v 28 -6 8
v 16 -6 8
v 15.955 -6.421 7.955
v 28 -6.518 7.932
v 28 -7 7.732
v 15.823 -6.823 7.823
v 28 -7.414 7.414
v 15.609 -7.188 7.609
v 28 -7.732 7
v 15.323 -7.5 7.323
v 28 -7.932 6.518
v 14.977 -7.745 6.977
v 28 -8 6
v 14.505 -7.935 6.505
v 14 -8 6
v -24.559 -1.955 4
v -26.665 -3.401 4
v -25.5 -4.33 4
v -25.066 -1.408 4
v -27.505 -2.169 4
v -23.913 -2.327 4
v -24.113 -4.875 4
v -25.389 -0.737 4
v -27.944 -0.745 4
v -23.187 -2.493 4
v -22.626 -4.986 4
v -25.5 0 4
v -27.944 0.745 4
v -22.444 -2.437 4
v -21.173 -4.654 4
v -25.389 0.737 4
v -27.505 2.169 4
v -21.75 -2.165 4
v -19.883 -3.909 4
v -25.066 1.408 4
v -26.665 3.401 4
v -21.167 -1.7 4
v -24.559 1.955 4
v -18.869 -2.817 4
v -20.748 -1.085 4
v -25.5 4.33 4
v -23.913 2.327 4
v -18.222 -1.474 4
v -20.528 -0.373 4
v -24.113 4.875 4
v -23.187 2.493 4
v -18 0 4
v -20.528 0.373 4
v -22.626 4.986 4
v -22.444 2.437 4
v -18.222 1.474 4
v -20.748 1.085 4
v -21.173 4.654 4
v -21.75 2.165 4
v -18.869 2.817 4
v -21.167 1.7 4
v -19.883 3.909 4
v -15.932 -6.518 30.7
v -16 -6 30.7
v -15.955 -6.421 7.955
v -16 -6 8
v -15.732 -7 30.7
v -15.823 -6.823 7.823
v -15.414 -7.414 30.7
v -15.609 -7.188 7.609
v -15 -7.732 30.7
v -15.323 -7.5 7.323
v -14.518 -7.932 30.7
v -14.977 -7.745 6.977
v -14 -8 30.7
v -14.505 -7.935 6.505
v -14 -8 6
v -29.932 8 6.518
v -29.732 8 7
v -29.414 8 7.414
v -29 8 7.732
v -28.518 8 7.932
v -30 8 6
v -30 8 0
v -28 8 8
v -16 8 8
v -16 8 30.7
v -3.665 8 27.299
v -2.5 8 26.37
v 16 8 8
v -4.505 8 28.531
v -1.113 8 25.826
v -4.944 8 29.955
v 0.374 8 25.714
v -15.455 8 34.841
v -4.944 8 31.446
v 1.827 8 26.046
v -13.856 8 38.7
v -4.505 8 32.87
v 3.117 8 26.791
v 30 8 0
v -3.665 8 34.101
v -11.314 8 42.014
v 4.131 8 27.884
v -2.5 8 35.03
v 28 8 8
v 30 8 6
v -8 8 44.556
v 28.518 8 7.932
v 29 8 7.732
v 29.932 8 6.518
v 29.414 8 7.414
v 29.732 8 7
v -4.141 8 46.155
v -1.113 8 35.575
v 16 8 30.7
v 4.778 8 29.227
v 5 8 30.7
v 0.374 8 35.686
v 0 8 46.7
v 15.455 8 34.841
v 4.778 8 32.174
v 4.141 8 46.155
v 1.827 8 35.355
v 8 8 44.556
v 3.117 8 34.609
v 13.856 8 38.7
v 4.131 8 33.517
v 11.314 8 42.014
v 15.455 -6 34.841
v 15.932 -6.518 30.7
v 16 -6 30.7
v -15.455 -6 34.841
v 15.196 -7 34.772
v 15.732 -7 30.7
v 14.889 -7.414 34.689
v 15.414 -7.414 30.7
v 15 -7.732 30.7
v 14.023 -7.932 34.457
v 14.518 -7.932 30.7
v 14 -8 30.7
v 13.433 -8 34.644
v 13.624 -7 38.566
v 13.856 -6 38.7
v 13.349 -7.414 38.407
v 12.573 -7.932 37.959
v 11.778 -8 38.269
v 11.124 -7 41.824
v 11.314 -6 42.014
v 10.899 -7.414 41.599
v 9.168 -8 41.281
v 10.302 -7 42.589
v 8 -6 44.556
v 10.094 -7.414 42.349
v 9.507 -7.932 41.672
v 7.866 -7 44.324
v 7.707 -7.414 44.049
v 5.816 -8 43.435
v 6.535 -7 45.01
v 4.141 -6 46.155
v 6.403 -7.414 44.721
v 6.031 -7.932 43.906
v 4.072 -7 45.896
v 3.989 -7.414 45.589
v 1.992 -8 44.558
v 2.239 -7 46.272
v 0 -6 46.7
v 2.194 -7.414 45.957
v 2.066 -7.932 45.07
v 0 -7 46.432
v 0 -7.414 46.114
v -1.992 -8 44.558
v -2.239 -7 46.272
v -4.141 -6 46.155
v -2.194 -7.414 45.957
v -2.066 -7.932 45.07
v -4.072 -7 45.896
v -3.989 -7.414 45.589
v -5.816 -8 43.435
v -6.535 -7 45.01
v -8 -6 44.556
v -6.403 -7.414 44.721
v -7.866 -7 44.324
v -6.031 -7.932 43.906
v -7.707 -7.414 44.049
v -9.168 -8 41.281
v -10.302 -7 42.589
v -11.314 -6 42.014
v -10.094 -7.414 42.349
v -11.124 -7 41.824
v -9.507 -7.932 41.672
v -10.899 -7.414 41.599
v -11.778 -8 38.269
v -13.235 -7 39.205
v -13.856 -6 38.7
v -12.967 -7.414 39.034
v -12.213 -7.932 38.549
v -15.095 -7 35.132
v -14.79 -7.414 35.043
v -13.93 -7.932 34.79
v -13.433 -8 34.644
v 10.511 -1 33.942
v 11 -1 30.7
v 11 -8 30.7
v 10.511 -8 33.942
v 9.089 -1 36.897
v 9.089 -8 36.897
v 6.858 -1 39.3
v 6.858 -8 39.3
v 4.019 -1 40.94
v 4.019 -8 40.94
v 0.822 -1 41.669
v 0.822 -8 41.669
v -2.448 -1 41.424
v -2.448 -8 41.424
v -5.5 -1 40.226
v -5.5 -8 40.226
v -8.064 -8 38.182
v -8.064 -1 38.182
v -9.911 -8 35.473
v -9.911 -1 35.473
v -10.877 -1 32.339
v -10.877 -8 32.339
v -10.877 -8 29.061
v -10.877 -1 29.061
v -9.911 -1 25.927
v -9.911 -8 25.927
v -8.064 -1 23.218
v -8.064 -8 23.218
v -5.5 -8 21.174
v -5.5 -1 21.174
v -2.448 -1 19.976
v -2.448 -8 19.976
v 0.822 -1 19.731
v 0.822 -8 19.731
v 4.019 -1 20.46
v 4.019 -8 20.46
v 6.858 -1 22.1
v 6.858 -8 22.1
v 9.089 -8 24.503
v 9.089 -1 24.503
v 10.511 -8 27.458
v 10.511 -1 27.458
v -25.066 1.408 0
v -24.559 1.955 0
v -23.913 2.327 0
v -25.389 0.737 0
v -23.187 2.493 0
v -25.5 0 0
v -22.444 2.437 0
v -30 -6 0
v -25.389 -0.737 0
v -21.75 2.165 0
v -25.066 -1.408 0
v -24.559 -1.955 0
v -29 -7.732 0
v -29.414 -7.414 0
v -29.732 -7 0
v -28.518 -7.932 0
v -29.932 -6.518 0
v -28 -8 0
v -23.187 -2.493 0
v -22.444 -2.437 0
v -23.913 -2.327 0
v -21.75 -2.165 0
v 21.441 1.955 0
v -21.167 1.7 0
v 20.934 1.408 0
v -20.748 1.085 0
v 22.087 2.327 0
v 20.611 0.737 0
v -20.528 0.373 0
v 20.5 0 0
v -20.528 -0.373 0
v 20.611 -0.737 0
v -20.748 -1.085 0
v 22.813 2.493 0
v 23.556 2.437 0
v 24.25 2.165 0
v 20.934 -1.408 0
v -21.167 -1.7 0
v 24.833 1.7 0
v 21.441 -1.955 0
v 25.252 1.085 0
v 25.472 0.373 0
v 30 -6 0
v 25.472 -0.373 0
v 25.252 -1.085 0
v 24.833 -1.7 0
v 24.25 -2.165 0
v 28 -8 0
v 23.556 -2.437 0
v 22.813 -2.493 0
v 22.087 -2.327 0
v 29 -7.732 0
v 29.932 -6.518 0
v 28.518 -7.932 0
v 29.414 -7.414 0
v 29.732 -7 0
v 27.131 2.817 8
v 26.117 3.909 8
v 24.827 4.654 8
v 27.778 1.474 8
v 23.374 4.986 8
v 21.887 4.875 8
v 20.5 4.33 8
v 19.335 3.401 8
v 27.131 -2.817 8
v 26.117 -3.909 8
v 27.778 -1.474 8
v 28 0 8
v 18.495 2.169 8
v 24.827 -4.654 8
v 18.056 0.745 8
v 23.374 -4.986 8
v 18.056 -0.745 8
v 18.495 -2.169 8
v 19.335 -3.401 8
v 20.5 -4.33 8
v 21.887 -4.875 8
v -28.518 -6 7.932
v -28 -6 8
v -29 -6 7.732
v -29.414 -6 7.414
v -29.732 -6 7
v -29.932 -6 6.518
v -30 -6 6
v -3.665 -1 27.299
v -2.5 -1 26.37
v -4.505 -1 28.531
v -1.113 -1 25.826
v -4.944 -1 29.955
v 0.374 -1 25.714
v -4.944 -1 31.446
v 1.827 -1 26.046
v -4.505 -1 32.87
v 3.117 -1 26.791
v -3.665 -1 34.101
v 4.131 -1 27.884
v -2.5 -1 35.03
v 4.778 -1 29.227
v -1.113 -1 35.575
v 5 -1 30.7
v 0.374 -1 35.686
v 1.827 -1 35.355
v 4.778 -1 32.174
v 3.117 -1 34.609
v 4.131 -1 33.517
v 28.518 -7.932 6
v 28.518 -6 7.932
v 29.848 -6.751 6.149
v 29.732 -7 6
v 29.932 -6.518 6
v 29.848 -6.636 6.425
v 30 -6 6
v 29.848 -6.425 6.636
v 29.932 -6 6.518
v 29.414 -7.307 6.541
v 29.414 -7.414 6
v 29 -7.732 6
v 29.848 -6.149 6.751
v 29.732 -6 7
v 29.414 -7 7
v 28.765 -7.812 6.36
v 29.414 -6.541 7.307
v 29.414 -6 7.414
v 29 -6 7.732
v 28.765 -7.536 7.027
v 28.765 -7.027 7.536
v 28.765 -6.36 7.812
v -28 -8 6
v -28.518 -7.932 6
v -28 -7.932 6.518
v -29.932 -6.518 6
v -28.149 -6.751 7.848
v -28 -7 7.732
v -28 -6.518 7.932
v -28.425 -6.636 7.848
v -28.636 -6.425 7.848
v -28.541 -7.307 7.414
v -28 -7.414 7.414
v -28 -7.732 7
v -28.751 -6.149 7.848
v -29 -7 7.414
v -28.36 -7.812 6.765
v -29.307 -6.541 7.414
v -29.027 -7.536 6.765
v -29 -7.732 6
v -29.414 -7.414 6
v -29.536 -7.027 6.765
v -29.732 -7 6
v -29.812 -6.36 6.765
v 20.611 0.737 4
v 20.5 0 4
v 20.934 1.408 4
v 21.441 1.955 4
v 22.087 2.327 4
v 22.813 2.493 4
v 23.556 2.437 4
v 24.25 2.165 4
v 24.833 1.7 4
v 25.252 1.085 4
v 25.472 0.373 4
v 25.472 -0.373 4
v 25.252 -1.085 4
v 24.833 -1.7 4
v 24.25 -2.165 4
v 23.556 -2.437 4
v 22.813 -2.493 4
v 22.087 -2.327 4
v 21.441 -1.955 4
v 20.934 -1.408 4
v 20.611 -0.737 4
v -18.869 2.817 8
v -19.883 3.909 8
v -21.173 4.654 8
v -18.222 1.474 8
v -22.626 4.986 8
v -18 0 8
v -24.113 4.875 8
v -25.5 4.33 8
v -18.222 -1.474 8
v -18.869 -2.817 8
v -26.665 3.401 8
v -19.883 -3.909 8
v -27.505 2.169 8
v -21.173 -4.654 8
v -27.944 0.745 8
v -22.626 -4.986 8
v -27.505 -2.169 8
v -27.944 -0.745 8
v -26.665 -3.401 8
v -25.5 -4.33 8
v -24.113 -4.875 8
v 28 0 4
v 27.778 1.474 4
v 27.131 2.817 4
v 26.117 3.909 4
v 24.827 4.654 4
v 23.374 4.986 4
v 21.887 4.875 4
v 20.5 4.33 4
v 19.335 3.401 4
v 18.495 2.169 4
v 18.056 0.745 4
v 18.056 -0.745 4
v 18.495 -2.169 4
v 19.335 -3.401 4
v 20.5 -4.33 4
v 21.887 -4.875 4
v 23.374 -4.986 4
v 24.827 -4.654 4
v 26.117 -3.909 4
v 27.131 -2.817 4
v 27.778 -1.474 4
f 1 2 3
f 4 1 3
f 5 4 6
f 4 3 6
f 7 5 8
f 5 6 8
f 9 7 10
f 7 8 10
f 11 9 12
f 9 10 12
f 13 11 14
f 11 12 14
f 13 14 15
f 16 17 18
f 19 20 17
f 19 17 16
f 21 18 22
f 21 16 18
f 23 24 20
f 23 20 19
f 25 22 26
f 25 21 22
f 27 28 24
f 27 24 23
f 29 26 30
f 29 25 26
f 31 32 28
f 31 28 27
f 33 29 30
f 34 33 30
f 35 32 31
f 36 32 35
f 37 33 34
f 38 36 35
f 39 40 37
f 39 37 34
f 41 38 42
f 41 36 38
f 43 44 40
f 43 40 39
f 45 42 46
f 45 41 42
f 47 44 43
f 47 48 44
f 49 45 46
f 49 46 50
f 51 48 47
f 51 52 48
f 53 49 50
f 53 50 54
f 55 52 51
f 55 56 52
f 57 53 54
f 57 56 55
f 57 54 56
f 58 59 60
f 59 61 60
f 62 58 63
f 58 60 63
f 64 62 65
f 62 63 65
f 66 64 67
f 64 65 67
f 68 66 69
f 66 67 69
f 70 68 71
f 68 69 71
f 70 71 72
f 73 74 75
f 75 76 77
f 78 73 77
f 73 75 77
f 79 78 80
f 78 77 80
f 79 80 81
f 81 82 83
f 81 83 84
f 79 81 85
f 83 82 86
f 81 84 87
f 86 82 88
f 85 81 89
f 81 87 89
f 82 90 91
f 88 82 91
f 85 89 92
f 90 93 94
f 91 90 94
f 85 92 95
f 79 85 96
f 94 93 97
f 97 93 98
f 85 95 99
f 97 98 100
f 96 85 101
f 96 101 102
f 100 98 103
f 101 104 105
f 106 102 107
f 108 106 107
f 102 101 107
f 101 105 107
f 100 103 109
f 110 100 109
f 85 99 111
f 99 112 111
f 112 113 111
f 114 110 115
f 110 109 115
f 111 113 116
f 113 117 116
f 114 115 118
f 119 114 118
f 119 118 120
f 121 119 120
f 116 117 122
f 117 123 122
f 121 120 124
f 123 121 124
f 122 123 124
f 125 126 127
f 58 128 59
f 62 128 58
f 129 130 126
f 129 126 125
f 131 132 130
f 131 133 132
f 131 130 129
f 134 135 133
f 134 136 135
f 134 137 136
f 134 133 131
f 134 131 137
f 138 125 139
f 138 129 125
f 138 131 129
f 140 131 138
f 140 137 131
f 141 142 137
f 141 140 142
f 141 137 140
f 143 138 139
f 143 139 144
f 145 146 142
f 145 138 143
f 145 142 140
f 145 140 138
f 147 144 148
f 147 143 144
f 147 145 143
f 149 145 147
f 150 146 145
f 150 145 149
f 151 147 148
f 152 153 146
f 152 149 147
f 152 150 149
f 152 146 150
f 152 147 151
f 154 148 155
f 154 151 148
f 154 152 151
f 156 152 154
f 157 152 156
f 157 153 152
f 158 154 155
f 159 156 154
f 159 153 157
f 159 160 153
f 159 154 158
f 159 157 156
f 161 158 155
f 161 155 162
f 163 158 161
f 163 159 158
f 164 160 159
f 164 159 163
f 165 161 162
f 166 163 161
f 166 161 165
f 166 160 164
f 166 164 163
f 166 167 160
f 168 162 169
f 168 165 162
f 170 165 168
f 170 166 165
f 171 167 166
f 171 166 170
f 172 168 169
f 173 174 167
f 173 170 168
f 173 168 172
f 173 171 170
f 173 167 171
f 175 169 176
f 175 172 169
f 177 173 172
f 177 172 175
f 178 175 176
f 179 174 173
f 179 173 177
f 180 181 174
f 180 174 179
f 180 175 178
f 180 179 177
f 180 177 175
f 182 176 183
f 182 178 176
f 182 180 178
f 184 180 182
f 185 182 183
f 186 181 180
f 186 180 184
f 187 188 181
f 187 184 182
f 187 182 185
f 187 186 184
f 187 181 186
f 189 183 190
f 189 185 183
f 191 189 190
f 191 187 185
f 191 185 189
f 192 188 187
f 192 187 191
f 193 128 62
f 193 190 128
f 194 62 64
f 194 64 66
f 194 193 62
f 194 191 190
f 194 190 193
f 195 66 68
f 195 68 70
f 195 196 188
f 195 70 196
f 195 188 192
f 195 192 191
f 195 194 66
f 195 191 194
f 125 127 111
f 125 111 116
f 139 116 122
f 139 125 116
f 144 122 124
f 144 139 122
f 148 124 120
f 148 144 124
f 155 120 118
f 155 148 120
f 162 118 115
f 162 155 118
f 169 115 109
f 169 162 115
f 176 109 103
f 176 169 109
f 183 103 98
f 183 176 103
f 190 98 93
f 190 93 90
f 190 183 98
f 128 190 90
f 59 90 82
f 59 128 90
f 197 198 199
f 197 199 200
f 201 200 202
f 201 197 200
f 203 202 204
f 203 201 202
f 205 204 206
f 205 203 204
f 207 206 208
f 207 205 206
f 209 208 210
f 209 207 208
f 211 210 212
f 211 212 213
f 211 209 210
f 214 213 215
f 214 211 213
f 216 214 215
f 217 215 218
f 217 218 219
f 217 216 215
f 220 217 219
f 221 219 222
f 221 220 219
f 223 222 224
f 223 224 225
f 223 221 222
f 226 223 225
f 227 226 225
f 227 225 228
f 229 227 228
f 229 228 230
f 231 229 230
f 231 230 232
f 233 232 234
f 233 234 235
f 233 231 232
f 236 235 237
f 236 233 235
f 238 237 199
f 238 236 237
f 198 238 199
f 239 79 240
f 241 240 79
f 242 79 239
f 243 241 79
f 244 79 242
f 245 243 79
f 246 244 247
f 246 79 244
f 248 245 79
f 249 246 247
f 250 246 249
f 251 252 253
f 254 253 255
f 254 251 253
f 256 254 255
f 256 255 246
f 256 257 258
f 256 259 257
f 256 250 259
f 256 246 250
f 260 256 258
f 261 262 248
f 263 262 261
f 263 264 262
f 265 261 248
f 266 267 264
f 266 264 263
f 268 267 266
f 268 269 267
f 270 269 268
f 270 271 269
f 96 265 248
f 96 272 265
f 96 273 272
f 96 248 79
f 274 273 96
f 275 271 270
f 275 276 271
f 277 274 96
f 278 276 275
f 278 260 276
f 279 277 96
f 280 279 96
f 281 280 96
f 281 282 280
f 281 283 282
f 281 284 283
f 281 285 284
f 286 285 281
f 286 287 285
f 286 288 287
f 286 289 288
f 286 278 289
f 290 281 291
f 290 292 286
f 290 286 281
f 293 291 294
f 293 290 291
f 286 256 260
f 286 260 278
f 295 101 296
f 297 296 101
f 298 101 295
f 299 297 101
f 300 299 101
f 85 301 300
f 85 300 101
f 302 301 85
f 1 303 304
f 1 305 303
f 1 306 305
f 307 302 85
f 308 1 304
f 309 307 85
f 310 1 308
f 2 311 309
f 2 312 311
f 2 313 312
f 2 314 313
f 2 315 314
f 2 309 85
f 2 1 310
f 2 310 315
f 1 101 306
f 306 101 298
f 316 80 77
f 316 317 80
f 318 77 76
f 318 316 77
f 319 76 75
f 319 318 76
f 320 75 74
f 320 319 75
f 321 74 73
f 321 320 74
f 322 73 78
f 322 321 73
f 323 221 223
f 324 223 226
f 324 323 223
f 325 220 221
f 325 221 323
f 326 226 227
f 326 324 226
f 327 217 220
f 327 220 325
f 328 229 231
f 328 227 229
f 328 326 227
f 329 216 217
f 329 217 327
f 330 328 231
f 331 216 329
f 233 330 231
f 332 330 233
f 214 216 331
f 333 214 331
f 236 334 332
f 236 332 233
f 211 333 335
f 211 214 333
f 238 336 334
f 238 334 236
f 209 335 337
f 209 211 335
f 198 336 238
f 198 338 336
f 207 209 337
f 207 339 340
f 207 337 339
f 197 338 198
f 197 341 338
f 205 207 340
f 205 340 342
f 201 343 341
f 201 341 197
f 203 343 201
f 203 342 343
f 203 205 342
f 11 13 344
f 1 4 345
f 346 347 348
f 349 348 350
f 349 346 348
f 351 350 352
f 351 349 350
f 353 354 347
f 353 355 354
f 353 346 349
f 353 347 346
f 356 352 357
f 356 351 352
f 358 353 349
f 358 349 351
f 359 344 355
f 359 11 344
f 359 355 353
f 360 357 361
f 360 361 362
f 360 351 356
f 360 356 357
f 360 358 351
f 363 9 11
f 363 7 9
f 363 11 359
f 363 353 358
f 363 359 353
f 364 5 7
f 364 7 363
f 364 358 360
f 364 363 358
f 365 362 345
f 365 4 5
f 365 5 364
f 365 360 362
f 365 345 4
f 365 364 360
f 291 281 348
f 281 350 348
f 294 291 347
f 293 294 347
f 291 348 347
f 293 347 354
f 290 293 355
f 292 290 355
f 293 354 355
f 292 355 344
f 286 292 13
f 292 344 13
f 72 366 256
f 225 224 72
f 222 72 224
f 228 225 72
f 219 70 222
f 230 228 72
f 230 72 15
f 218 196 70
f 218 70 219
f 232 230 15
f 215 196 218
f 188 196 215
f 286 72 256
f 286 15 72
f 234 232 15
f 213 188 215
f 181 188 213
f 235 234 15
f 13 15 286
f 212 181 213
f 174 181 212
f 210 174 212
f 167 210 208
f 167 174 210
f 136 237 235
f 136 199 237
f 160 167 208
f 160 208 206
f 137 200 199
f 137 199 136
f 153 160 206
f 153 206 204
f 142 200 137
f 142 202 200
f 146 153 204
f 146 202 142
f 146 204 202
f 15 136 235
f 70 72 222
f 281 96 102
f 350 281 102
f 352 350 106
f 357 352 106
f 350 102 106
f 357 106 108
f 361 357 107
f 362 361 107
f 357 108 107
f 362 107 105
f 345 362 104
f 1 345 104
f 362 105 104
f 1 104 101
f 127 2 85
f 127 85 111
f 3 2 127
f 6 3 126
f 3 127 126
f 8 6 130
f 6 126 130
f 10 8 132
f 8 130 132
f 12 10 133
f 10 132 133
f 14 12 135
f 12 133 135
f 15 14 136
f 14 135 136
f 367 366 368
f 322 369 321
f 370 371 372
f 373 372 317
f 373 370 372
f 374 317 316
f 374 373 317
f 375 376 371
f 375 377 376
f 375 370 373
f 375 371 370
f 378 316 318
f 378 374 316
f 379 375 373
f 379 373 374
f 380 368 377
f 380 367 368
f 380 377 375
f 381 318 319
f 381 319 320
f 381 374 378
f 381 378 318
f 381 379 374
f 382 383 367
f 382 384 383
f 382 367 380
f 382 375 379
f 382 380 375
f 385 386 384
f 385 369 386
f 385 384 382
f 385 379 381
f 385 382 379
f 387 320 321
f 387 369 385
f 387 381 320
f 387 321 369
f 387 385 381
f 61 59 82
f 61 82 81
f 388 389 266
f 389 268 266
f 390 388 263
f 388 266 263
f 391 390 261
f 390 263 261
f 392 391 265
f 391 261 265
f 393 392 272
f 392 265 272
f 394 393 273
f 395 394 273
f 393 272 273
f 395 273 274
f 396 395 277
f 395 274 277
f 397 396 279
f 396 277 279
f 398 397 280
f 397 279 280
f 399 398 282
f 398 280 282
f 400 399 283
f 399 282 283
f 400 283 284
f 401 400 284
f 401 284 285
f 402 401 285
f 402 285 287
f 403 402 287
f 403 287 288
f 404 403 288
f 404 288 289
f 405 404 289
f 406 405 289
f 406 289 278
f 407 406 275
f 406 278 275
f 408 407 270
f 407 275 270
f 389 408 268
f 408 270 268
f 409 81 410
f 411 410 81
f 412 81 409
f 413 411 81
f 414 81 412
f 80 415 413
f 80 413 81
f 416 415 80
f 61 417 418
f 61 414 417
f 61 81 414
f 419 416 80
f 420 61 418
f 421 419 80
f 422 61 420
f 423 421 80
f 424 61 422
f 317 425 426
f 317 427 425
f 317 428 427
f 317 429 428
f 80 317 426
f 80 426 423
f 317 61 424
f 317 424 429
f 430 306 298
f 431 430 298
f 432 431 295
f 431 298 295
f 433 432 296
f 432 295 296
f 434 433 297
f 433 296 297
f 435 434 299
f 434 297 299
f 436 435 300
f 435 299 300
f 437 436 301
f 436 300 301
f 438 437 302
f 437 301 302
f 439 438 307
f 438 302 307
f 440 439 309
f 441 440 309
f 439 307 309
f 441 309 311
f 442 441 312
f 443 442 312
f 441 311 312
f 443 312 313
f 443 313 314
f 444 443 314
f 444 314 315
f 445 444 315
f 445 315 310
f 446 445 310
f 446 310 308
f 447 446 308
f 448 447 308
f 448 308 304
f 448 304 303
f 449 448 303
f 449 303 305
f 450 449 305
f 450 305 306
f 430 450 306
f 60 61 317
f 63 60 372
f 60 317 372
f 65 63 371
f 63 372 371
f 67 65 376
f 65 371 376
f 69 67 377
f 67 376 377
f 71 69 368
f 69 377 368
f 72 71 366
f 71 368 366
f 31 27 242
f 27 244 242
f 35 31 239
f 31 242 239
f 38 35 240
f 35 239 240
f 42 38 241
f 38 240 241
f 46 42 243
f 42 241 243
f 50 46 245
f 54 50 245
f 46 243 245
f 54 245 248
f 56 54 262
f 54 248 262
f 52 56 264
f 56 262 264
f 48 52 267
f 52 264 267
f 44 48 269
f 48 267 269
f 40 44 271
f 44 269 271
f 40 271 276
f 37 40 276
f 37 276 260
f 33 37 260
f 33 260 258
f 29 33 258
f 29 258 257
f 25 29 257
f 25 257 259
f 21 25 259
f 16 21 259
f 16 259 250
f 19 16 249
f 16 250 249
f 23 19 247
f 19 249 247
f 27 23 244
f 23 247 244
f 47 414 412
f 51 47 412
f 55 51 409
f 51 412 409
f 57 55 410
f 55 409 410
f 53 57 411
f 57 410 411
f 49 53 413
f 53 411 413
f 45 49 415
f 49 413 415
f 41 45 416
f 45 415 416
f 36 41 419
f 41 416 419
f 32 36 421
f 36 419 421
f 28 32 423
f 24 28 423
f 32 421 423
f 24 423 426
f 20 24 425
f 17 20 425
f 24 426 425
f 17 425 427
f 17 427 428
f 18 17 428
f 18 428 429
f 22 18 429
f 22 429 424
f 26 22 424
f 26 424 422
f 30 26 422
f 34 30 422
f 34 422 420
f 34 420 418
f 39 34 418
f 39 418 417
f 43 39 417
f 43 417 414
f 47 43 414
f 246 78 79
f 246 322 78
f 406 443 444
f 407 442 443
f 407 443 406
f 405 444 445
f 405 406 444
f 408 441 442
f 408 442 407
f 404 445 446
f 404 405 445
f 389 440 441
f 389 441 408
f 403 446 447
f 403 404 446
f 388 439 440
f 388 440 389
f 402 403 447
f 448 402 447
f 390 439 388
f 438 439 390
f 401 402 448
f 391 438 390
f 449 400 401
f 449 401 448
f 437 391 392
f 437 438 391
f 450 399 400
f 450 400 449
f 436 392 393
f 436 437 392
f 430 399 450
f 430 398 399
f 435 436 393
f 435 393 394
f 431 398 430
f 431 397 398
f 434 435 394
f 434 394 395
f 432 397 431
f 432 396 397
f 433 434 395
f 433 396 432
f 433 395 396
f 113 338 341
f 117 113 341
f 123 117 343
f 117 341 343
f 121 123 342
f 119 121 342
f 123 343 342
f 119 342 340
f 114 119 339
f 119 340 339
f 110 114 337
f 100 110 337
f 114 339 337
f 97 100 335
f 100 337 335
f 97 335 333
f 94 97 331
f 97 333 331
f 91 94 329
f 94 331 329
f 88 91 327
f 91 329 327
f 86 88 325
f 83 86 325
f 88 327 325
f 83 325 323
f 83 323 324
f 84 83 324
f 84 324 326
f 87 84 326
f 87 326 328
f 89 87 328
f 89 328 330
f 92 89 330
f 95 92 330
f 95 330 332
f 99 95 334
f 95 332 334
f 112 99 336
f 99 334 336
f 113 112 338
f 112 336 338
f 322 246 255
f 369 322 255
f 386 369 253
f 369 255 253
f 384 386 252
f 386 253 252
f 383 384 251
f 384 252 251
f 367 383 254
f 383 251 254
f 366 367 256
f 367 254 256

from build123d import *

# Parameters (mm, degrees)
F0_R           = 11
F1_DEPTH       = 8
F3_R           = 11.4612754368
F3_R_2         = 5
F4_DEPTH       = 9
F6_D           = 5
F6_CBORE_D     = 10
F6_CBORE_DEPTH = 4
F7_R           = 1.99999


# Not quite as in the source:
# - a fillet or chamfer is up to 0.001 mm smaller than in the source, because OpenCascade refuses the exact size


with BuildPart() as f1:
    # F0 (on Front) → F1 (new body, symmetric)
    with BuildSketch(Plane.XZ):
        with BuildLine():
            Line((16, 8), (16, 30.7))
            ThreePointArc((16, 30.7), (0, 46.7), (-16, 30.7))
            Line((-16, 30.7), (-16, 8))
            Line((-16, 8), (-30, 8))
            Line((-30, 8), (-30, 0))
            Line((-30, 0), (30, 0))
            Line((30, 0), (30, 8))
            Line((30, 8), (16, 8))
        make_face()
        with Locations((0, 30.7)):
            Circle(F0_R, mode=Mode.SUBTRACT)
    extrude(amount=F1_DEPTH, both=True)

    # F3 (on offset) → F4 (join)
    with BuildSketch(Plane.XZ.offset(1)):
        with Locations((0, 30.7003352791)):
            Circle(F3_R)
        with Locations((0, 30.7003352791)):
            Circle(F3_R_2, mode=Mode.SUBTRACT)
    extrude(amount=-F4_DEPTH)

    # F6 (through all)
    with Locations(Plane.XY.offset(8)):
        with Locations((-23, 0), (23, 0)):
            CounterBoreHole(F6_D / 2, F6_CBORE_D / 2, F6_CBORE_DEPTH)

    # F7 (radius 2 in the source; OpenCascade refuses exactly that, so slightly less here)
    f7_edges = [f1.edges().sort_by_distance(p)[0] for p in [
        (-30, -8, 4),
        (-23, -8, 8),
        (-16, -8, 19.35),
        (23, -8, 8),
        (30, -8, 4),
        (-30, 0, 8),
        (30, 0, 8),
    ]]
    fillet(f7_edges, radius=F7_R)


solid = f1.part
